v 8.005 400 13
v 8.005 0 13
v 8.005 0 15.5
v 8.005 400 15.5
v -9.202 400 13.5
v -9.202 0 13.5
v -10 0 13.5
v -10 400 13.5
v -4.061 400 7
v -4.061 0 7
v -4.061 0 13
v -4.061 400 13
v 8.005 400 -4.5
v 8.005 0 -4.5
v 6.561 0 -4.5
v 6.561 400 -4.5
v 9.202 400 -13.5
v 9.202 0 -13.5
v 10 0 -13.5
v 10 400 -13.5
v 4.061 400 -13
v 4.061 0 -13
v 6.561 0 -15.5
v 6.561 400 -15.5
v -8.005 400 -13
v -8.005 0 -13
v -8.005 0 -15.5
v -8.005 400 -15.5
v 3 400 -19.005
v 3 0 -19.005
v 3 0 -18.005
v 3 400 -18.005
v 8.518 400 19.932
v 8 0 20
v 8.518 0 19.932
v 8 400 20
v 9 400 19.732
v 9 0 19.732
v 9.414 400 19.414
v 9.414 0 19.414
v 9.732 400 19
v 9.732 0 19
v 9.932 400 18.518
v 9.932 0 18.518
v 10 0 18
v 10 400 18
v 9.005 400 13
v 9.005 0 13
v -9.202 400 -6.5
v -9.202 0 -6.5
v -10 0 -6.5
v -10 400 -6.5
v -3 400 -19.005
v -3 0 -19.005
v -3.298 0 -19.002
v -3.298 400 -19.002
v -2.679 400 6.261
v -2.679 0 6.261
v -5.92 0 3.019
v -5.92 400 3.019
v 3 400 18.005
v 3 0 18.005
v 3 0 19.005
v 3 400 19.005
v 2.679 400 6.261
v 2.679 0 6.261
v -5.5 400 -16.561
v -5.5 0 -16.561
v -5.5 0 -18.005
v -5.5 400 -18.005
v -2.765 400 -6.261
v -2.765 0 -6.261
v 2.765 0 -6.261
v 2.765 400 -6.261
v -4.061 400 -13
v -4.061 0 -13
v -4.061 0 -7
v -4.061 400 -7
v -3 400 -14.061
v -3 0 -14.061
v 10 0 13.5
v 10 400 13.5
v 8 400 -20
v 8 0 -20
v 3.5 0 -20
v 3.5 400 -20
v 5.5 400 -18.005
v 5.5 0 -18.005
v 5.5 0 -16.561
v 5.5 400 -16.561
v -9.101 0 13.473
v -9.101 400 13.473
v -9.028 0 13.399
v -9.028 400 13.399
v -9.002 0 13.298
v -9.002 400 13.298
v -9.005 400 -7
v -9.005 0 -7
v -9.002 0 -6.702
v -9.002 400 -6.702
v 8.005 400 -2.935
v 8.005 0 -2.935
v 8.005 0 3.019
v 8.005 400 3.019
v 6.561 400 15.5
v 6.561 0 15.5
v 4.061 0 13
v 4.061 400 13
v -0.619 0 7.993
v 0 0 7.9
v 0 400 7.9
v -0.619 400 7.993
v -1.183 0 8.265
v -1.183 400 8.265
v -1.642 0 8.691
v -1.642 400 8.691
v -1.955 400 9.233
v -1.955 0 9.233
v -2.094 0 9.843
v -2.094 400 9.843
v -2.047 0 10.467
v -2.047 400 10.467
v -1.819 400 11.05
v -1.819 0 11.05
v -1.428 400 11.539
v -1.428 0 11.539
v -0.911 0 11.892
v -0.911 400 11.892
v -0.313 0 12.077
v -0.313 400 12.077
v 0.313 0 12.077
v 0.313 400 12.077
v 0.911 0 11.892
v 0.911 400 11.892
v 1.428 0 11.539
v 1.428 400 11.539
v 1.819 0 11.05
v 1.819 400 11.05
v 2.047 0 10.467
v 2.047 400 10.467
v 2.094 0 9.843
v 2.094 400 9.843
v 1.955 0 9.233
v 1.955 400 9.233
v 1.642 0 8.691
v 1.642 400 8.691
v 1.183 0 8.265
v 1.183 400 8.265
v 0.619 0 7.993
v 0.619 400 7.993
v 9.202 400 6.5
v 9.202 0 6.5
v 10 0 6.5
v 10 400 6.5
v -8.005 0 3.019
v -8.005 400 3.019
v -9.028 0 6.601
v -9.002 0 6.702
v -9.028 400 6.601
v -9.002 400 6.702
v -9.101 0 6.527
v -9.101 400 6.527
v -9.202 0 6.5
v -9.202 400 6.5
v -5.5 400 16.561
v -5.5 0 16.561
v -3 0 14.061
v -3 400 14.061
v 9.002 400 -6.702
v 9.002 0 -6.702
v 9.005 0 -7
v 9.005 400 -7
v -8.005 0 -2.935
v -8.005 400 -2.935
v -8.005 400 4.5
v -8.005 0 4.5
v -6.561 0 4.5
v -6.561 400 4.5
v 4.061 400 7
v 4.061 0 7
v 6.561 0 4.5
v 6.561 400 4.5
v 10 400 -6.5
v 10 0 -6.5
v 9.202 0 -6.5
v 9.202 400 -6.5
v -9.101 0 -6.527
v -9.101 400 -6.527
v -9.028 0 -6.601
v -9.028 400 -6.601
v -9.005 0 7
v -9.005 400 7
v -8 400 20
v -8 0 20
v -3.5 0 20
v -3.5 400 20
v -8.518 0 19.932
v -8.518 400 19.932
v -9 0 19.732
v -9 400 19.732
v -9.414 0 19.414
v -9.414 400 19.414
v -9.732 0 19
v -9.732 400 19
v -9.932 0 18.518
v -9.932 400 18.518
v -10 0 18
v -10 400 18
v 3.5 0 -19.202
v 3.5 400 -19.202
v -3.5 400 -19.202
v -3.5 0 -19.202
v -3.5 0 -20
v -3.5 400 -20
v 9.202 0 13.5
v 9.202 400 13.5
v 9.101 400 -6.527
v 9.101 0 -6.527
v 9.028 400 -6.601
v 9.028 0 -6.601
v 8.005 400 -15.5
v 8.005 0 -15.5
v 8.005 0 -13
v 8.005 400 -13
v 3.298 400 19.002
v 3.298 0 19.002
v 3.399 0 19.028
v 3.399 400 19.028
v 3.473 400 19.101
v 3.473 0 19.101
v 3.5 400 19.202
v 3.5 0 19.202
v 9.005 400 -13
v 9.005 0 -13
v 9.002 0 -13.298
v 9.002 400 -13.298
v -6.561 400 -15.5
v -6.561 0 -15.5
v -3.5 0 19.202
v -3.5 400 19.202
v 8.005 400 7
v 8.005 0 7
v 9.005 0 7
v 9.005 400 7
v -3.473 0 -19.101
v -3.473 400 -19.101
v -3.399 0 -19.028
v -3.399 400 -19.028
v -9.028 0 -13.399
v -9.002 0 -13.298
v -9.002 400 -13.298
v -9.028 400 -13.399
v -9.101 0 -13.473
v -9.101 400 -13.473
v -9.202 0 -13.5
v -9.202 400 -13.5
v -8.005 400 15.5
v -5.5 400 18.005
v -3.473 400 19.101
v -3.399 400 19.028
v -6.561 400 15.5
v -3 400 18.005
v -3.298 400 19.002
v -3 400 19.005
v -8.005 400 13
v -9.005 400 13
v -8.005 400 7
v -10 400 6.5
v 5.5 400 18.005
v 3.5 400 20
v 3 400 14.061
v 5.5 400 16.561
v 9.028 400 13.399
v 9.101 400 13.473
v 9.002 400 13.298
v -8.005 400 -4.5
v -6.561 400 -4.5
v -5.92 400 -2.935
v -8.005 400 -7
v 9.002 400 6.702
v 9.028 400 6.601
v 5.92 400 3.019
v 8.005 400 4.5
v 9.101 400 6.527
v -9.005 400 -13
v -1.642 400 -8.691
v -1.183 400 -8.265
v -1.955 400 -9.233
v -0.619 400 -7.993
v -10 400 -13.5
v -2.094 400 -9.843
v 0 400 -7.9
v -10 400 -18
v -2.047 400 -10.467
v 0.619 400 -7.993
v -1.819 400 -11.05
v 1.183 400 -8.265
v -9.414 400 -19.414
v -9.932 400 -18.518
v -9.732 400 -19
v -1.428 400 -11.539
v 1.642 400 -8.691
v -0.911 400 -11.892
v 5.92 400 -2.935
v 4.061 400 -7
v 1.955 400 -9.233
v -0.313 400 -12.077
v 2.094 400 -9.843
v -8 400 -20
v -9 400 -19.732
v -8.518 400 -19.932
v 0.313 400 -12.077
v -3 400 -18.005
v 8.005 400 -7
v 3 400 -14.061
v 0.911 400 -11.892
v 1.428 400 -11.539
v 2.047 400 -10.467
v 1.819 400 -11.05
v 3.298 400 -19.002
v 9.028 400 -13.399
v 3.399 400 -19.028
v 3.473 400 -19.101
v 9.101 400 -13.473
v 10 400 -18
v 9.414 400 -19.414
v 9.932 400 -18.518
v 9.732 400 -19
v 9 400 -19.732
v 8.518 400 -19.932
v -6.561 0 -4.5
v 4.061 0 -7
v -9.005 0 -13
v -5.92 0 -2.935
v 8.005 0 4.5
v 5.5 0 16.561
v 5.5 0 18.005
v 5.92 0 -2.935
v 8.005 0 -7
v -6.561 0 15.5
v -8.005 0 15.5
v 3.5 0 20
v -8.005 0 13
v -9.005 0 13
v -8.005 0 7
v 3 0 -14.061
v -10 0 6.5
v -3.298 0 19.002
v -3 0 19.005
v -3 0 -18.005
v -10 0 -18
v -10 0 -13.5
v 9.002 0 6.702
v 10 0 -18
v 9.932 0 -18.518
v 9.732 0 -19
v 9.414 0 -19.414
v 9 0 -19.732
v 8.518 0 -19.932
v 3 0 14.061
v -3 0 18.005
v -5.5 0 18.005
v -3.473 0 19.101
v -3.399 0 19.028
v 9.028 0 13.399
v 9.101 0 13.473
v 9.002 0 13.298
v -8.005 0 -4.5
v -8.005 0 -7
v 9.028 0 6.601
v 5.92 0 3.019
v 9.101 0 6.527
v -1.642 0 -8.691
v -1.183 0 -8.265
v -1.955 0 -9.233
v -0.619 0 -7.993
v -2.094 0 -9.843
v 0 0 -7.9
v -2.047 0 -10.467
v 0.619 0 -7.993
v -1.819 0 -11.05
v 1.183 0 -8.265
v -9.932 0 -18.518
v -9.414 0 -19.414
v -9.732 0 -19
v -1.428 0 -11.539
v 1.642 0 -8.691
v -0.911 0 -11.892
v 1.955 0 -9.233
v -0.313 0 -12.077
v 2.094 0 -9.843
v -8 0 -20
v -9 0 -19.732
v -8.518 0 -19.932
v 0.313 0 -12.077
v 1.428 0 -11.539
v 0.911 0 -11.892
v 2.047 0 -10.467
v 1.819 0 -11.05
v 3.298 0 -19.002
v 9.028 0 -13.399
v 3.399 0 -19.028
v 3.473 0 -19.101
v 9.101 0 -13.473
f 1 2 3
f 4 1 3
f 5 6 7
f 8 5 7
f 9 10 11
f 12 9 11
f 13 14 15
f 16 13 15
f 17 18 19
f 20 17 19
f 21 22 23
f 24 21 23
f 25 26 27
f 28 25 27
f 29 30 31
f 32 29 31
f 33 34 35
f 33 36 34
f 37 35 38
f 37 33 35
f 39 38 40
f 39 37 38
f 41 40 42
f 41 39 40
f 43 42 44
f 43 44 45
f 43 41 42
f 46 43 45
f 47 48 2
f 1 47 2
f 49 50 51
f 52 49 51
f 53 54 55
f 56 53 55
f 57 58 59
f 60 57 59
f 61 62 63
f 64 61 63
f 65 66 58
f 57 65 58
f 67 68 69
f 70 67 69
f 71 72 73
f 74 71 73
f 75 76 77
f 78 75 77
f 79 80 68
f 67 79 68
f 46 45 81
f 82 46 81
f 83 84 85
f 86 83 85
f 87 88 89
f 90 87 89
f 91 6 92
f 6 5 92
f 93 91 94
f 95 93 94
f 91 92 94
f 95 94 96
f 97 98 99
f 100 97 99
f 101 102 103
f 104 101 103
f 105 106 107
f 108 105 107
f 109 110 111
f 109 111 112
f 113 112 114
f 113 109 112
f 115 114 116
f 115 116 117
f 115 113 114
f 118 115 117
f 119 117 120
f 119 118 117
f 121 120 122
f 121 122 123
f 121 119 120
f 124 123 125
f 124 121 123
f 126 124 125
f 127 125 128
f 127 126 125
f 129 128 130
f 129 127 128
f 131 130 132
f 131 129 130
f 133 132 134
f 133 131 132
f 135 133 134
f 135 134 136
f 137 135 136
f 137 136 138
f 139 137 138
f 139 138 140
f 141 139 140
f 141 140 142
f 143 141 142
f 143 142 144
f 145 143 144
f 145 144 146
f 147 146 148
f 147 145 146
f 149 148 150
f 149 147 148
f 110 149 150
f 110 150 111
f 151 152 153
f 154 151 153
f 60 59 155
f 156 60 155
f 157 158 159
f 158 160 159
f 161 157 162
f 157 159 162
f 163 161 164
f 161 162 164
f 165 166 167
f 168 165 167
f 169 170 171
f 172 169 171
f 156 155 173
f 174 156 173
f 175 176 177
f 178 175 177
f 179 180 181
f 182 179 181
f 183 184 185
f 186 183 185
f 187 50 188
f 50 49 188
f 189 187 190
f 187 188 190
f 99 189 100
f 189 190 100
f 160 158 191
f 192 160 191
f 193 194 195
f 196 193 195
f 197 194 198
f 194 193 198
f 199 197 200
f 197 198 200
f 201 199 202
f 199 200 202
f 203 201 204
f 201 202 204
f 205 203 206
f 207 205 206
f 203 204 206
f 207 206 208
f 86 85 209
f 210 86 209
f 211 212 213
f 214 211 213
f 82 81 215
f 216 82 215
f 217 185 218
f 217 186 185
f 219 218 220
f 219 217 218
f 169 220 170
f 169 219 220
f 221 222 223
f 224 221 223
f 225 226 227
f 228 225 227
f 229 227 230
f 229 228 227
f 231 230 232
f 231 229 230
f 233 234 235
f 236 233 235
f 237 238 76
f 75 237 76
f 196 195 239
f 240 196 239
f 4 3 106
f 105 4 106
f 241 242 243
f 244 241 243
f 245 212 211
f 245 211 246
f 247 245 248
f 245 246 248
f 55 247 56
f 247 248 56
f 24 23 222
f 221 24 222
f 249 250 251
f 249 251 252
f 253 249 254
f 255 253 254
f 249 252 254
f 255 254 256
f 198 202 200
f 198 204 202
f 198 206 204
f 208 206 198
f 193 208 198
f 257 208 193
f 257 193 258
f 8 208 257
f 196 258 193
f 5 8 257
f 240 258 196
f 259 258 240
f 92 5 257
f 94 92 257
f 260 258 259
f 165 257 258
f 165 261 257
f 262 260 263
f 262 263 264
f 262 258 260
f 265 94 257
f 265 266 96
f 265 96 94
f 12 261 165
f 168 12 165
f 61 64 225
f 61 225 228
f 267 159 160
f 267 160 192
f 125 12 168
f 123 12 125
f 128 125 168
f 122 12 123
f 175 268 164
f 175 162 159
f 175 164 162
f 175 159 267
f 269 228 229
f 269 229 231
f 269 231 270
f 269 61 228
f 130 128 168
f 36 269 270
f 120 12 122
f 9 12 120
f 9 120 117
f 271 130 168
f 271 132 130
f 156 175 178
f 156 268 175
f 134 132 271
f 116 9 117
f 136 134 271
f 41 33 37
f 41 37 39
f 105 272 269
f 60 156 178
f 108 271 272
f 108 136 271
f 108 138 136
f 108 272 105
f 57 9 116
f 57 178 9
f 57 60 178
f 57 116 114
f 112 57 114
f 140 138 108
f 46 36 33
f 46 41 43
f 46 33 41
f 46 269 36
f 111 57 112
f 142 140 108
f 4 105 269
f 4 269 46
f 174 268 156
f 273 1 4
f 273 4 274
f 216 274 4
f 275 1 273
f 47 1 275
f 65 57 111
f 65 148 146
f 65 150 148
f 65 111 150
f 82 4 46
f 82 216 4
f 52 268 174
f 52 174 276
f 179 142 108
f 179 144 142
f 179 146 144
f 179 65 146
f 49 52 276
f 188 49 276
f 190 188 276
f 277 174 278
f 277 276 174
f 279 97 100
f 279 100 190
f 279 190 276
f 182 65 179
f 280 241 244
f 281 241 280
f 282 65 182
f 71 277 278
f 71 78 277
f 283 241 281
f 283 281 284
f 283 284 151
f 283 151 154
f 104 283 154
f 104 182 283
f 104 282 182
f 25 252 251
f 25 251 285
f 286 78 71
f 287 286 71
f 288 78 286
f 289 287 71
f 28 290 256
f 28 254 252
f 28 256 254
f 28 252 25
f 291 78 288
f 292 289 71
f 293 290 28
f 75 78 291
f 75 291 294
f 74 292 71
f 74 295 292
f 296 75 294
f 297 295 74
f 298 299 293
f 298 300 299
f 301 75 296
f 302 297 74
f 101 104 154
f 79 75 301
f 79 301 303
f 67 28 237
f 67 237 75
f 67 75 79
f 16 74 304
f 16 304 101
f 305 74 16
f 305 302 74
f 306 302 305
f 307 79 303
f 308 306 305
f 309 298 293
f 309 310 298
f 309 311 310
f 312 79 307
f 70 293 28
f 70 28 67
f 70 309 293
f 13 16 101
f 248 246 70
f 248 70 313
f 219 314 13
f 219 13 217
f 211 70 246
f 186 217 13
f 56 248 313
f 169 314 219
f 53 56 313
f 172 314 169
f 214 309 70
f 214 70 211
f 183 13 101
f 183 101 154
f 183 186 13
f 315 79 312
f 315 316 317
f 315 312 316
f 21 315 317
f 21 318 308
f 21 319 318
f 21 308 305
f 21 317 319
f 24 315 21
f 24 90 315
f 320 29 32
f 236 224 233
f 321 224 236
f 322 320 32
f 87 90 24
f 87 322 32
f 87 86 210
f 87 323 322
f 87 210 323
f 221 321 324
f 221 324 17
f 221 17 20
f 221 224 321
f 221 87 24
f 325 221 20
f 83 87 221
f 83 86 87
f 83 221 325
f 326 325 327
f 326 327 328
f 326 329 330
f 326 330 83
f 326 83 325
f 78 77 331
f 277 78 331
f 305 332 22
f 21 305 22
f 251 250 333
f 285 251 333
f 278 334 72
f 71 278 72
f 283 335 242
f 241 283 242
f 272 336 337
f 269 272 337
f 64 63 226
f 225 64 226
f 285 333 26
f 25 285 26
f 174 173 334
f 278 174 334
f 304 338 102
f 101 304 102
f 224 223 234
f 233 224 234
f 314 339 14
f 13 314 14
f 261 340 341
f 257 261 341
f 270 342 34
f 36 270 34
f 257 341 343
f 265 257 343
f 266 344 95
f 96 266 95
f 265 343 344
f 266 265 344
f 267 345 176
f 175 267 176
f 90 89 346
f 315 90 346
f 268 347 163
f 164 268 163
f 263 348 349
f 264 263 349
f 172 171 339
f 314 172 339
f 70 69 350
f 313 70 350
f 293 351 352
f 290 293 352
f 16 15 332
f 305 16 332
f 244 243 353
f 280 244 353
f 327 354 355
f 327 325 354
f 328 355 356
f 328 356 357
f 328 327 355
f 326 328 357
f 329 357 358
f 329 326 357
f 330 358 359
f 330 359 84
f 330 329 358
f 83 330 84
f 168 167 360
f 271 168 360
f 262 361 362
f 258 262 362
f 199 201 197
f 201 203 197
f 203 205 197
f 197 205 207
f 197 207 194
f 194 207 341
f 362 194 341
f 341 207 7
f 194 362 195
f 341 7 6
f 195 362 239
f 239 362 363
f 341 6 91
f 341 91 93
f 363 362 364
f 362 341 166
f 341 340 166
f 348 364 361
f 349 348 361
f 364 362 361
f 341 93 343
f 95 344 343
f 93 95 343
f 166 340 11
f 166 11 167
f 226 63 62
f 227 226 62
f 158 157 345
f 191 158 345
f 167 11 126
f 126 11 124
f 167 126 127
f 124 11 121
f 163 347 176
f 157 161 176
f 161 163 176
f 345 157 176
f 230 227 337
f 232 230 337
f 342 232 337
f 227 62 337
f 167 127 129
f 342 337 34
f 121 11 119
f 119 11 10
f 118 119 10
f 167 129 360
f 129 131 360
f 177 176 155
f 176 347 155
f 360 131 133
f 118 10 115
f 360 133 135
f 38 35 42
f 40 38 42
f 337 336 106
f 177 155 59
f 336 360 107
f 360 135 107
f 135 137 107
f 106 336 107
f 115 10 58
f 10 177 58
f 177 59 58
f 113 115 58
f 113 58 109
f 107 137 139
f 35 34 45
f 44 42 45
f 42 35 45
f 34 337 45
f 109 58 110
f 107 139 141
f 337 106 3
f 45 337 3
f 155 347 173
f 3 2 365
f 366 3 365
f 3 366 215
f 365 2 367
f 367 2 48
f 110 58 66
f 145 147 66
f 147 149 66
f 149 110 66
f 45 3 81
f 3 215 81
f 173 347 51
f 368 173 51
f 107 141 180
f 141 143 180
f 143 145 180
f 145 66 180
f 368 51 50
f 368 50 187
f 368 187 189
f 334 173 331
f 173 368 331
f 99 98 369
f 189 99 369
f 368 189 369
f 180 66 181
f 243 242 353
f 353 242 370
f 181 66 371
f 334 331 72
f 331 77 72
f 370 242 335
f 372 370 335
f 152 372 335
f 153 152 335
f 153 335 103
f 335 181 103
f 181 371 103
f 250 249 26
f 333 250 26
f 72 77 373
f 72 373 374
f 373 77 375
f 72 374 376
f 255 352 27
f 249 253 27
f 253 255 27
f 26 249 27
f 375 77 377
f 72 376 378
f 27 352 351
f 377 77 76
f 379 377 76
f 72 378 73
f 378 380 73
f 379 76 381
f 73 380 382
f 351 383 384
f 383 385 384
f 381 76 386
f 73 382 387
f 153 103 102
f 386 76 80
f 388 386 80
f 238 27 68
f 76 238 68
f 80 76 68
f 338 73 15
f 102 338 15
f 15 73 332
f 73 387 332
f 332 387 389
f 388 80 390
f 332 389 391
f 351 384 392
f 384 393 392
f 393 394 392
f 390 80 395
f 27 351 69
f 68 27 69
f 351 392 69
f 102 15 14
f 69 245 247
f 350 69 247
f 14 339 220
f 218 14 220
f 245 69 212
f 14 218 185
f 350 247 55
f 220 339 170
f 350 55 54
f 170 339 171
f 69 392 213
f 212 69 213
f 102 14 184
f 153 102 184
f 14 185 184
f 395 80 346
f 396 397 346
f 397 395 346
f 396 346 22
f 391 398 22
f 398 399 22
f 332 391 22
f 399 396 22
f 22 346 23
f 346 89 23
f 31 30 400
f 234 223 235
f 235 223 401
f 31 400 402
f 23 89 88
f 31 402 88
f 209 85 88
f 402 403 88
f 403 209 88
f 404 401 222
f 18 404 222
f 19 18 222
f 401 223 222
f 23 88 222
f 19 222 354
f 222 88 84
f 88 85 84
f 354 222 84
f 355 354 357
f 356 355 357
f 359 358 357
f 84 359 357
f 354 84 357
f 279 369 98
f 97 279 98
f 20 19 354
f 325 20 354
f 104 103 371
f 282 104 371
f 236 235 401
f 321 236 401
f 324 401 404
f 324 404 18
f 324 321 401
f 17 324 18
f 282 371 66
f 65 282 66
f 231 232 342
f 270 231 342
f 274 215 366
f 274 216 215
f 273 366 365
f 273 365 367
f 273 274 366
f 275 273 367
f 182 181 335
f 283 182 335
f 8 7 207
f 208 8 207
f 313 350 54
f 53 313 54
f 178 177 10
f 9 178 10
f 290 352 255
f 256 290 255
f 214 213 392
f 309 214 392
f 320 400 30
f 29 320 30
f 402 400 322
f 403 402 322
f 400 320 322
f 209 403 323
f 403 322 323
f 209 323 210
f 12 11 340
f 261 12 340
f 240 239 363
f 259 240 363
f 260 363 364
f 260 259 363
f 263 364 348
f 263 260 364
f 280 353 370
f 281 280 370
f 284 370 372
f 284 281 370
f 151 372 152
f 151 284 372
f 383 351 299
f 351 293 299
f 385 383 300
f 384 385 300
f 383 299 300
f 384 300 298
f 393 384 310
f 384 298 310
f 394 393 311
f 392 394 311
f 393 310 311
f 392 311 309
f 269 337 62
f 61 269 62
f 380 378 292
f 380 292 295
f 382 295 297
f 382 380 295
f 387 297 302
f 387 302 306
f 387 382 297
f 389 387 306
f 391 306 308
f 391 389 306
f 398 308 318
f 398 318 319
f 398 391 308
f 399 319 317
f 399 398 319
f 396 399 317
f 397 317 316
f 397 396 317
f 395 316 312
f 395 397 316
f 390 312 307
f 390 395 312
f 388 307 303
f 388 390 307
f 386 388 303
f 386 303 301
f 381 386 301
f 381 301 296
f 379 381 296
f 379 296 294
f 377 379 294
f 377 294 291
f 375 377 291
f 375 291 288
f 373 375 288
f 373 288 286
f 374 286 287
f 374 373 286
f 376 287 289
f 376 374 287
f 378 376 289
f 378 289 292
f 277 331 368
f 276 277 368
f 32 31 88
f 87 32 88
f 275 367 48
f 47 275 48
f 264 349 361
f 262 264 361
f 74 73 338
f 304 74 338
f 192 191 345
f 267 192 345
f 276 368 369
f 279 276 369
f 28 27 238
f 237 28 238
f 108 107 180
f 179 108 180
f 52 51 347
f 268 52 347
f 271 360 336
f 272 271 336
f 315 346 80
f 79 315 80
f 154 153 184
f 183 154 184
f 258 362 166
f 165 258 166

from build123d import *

# Parameters (mm, degrees)
SKETCH_2_R      = 2.1
EXTRUDE_1_DEPTH = 400
FILLET_1_R      = 2
FILLET_2_R      = 0.2


with BuildPart() as part:
    # Эскиз2 → Бобышка-Вытянуть1 (new body)
    with BuildSketch(Plane(origin=(0, 0, 0), x_dir=(1, 0, 0), z_dir=(0, 1, 0))):
        Polygon((-10, -20), (-3.5, -20), (-3.5, -19), (-3, -19.005012563), (-3, -18.005012563), (-5.5, -18.005012563), (-5.5, -16.560660172), (-3, -14.060660172), (3, -14.060660172), (5.5, -16.560660172), (5.5, -18.005012563), (3, -18.005012563), (3, -19.005012563), (3.5, -19), (3.5, -20), (10, -20), (10, -13.5), (9, -13.5), (9.005012563, -13), (8.005012563, -13), (8.005012563, -15.5), (6.560660172, -15.5), (4.060660172, -13), (4.060660172, -7), (6.560660172, -4.5), (8.005012563, -4.5), (8.005012563, -7), (9.005012563, -7), (9, -6.5), (10, -6.5), (10, 6.5), (9, 6.5), (9.005012563, 7), (8.005012563, 7), (8.005012563, 4.5), (6.560660172, 4.5), (4.060660172, 7), (4.060660172, 13), (6.560660172, 15.5), (8.005012563, 15.5), (8.005012563, 13), (9.005012563, 13), (9, 13.5), (10, 13.5), (10, 20), (3.5, 20), (3.5, 19), (3, 19.005012563), (3, 18.005012563), (5.5, 18.005012563), (5.5, 16.560660172), (3, 14.060660172), (-3, 14.060660172), (-5.5, 16.560660172), (-5.5, 18.005012563), (-3, 18.005012563), (-3, 19.005012563), (-3.5, 19), (-3.5, 20), (-10, 20), (-10, 13.5), (-9, 13.5), (-9.005012563, 13), (-8.005012563, 13), (-8.005012563, 15.5), (-6.560660172, 15.5), (-4.060660172, 13), (-4.060660172, 7), (-6.560660172, 4.5), (-8.005012563, 4.5), (-8.005012563, 7), (-9.005012563, 7), (-9, 6.5), (-10, 6.5), (-10, -6.5), (-9, -6.5), (-9.005012563, -7), (-8.005012563, -7), (-8.005012563, -4.5), (-6.560660172, -4.5), (-4.060660172, -7), (-4.060660172, -13), (-6.560660172, -15.5), (-8.005012563, -15.5), (-8.005012563, -13), (-9.005012563, -13), (-9, -13.5), (-10, -13.5), align=None)
        with Locations(Location((0, 10, 0), (0, 0, 270))):
            Circle(SKETCH_2_R, mode=Mode.SUBTRACT)
        with Locations(Location((0, -10, 0), (0, 0, 90))):
            Circle(SKETCH_2_R, mode=Mode.SUBTRACT)
        Polygon((-2.764646715, 6.260660172), (2.764646715, 6.260660172), (5.920319141, 2.935275287), (8.005012563, 2.935275287), (8.005012563, -3.019020687), (5.920319141, -3.019020687), (2.678679656, -6.260660172), (-2.678679656, -6.260660172), (-5.920319141, -3.019020687), (-8.005012563, -3.019020687), (-8.005012563, 2.935275287), (-5.920319141, 2.935275287), align=None, mode=Mode.SUBTRACT)
    extrude(amount=EXTRUDE_1_DEPTH)

    # Скругление1
    fillet_1_edges = [part.edges().sort_by_distance(p)[0] for p in [
        (-10, 200, -20),
        (10, 200, -20),
        (10, 200, 20),
        (-10, 200, 20),
    ]]
    fillet(fillet_1_edges, radius=FILLET_1_R)

    # Скругление2
    fillet_2_edges = [part.edges().sort_by_distance(p)[0] for p in [
        (-9, 200, 13.5),
        (-9, 200, 6.5),
        (-9, 200, -6.5),
        (-9, 200, -13.5),
        (-3.5, 200, -19),
        (3.5, 200, -19),
        (9, 200, -13.5),
        (9, 200, -6.5),
        (9, 200, 6.5),
        (9, 200, 13.5),
        (3.5, 200, 19),
        (-3.5, 200, 19),
    ]]
    fillet(fillet_2_edges, radius=FILLET_2_R)


solid = part.part
